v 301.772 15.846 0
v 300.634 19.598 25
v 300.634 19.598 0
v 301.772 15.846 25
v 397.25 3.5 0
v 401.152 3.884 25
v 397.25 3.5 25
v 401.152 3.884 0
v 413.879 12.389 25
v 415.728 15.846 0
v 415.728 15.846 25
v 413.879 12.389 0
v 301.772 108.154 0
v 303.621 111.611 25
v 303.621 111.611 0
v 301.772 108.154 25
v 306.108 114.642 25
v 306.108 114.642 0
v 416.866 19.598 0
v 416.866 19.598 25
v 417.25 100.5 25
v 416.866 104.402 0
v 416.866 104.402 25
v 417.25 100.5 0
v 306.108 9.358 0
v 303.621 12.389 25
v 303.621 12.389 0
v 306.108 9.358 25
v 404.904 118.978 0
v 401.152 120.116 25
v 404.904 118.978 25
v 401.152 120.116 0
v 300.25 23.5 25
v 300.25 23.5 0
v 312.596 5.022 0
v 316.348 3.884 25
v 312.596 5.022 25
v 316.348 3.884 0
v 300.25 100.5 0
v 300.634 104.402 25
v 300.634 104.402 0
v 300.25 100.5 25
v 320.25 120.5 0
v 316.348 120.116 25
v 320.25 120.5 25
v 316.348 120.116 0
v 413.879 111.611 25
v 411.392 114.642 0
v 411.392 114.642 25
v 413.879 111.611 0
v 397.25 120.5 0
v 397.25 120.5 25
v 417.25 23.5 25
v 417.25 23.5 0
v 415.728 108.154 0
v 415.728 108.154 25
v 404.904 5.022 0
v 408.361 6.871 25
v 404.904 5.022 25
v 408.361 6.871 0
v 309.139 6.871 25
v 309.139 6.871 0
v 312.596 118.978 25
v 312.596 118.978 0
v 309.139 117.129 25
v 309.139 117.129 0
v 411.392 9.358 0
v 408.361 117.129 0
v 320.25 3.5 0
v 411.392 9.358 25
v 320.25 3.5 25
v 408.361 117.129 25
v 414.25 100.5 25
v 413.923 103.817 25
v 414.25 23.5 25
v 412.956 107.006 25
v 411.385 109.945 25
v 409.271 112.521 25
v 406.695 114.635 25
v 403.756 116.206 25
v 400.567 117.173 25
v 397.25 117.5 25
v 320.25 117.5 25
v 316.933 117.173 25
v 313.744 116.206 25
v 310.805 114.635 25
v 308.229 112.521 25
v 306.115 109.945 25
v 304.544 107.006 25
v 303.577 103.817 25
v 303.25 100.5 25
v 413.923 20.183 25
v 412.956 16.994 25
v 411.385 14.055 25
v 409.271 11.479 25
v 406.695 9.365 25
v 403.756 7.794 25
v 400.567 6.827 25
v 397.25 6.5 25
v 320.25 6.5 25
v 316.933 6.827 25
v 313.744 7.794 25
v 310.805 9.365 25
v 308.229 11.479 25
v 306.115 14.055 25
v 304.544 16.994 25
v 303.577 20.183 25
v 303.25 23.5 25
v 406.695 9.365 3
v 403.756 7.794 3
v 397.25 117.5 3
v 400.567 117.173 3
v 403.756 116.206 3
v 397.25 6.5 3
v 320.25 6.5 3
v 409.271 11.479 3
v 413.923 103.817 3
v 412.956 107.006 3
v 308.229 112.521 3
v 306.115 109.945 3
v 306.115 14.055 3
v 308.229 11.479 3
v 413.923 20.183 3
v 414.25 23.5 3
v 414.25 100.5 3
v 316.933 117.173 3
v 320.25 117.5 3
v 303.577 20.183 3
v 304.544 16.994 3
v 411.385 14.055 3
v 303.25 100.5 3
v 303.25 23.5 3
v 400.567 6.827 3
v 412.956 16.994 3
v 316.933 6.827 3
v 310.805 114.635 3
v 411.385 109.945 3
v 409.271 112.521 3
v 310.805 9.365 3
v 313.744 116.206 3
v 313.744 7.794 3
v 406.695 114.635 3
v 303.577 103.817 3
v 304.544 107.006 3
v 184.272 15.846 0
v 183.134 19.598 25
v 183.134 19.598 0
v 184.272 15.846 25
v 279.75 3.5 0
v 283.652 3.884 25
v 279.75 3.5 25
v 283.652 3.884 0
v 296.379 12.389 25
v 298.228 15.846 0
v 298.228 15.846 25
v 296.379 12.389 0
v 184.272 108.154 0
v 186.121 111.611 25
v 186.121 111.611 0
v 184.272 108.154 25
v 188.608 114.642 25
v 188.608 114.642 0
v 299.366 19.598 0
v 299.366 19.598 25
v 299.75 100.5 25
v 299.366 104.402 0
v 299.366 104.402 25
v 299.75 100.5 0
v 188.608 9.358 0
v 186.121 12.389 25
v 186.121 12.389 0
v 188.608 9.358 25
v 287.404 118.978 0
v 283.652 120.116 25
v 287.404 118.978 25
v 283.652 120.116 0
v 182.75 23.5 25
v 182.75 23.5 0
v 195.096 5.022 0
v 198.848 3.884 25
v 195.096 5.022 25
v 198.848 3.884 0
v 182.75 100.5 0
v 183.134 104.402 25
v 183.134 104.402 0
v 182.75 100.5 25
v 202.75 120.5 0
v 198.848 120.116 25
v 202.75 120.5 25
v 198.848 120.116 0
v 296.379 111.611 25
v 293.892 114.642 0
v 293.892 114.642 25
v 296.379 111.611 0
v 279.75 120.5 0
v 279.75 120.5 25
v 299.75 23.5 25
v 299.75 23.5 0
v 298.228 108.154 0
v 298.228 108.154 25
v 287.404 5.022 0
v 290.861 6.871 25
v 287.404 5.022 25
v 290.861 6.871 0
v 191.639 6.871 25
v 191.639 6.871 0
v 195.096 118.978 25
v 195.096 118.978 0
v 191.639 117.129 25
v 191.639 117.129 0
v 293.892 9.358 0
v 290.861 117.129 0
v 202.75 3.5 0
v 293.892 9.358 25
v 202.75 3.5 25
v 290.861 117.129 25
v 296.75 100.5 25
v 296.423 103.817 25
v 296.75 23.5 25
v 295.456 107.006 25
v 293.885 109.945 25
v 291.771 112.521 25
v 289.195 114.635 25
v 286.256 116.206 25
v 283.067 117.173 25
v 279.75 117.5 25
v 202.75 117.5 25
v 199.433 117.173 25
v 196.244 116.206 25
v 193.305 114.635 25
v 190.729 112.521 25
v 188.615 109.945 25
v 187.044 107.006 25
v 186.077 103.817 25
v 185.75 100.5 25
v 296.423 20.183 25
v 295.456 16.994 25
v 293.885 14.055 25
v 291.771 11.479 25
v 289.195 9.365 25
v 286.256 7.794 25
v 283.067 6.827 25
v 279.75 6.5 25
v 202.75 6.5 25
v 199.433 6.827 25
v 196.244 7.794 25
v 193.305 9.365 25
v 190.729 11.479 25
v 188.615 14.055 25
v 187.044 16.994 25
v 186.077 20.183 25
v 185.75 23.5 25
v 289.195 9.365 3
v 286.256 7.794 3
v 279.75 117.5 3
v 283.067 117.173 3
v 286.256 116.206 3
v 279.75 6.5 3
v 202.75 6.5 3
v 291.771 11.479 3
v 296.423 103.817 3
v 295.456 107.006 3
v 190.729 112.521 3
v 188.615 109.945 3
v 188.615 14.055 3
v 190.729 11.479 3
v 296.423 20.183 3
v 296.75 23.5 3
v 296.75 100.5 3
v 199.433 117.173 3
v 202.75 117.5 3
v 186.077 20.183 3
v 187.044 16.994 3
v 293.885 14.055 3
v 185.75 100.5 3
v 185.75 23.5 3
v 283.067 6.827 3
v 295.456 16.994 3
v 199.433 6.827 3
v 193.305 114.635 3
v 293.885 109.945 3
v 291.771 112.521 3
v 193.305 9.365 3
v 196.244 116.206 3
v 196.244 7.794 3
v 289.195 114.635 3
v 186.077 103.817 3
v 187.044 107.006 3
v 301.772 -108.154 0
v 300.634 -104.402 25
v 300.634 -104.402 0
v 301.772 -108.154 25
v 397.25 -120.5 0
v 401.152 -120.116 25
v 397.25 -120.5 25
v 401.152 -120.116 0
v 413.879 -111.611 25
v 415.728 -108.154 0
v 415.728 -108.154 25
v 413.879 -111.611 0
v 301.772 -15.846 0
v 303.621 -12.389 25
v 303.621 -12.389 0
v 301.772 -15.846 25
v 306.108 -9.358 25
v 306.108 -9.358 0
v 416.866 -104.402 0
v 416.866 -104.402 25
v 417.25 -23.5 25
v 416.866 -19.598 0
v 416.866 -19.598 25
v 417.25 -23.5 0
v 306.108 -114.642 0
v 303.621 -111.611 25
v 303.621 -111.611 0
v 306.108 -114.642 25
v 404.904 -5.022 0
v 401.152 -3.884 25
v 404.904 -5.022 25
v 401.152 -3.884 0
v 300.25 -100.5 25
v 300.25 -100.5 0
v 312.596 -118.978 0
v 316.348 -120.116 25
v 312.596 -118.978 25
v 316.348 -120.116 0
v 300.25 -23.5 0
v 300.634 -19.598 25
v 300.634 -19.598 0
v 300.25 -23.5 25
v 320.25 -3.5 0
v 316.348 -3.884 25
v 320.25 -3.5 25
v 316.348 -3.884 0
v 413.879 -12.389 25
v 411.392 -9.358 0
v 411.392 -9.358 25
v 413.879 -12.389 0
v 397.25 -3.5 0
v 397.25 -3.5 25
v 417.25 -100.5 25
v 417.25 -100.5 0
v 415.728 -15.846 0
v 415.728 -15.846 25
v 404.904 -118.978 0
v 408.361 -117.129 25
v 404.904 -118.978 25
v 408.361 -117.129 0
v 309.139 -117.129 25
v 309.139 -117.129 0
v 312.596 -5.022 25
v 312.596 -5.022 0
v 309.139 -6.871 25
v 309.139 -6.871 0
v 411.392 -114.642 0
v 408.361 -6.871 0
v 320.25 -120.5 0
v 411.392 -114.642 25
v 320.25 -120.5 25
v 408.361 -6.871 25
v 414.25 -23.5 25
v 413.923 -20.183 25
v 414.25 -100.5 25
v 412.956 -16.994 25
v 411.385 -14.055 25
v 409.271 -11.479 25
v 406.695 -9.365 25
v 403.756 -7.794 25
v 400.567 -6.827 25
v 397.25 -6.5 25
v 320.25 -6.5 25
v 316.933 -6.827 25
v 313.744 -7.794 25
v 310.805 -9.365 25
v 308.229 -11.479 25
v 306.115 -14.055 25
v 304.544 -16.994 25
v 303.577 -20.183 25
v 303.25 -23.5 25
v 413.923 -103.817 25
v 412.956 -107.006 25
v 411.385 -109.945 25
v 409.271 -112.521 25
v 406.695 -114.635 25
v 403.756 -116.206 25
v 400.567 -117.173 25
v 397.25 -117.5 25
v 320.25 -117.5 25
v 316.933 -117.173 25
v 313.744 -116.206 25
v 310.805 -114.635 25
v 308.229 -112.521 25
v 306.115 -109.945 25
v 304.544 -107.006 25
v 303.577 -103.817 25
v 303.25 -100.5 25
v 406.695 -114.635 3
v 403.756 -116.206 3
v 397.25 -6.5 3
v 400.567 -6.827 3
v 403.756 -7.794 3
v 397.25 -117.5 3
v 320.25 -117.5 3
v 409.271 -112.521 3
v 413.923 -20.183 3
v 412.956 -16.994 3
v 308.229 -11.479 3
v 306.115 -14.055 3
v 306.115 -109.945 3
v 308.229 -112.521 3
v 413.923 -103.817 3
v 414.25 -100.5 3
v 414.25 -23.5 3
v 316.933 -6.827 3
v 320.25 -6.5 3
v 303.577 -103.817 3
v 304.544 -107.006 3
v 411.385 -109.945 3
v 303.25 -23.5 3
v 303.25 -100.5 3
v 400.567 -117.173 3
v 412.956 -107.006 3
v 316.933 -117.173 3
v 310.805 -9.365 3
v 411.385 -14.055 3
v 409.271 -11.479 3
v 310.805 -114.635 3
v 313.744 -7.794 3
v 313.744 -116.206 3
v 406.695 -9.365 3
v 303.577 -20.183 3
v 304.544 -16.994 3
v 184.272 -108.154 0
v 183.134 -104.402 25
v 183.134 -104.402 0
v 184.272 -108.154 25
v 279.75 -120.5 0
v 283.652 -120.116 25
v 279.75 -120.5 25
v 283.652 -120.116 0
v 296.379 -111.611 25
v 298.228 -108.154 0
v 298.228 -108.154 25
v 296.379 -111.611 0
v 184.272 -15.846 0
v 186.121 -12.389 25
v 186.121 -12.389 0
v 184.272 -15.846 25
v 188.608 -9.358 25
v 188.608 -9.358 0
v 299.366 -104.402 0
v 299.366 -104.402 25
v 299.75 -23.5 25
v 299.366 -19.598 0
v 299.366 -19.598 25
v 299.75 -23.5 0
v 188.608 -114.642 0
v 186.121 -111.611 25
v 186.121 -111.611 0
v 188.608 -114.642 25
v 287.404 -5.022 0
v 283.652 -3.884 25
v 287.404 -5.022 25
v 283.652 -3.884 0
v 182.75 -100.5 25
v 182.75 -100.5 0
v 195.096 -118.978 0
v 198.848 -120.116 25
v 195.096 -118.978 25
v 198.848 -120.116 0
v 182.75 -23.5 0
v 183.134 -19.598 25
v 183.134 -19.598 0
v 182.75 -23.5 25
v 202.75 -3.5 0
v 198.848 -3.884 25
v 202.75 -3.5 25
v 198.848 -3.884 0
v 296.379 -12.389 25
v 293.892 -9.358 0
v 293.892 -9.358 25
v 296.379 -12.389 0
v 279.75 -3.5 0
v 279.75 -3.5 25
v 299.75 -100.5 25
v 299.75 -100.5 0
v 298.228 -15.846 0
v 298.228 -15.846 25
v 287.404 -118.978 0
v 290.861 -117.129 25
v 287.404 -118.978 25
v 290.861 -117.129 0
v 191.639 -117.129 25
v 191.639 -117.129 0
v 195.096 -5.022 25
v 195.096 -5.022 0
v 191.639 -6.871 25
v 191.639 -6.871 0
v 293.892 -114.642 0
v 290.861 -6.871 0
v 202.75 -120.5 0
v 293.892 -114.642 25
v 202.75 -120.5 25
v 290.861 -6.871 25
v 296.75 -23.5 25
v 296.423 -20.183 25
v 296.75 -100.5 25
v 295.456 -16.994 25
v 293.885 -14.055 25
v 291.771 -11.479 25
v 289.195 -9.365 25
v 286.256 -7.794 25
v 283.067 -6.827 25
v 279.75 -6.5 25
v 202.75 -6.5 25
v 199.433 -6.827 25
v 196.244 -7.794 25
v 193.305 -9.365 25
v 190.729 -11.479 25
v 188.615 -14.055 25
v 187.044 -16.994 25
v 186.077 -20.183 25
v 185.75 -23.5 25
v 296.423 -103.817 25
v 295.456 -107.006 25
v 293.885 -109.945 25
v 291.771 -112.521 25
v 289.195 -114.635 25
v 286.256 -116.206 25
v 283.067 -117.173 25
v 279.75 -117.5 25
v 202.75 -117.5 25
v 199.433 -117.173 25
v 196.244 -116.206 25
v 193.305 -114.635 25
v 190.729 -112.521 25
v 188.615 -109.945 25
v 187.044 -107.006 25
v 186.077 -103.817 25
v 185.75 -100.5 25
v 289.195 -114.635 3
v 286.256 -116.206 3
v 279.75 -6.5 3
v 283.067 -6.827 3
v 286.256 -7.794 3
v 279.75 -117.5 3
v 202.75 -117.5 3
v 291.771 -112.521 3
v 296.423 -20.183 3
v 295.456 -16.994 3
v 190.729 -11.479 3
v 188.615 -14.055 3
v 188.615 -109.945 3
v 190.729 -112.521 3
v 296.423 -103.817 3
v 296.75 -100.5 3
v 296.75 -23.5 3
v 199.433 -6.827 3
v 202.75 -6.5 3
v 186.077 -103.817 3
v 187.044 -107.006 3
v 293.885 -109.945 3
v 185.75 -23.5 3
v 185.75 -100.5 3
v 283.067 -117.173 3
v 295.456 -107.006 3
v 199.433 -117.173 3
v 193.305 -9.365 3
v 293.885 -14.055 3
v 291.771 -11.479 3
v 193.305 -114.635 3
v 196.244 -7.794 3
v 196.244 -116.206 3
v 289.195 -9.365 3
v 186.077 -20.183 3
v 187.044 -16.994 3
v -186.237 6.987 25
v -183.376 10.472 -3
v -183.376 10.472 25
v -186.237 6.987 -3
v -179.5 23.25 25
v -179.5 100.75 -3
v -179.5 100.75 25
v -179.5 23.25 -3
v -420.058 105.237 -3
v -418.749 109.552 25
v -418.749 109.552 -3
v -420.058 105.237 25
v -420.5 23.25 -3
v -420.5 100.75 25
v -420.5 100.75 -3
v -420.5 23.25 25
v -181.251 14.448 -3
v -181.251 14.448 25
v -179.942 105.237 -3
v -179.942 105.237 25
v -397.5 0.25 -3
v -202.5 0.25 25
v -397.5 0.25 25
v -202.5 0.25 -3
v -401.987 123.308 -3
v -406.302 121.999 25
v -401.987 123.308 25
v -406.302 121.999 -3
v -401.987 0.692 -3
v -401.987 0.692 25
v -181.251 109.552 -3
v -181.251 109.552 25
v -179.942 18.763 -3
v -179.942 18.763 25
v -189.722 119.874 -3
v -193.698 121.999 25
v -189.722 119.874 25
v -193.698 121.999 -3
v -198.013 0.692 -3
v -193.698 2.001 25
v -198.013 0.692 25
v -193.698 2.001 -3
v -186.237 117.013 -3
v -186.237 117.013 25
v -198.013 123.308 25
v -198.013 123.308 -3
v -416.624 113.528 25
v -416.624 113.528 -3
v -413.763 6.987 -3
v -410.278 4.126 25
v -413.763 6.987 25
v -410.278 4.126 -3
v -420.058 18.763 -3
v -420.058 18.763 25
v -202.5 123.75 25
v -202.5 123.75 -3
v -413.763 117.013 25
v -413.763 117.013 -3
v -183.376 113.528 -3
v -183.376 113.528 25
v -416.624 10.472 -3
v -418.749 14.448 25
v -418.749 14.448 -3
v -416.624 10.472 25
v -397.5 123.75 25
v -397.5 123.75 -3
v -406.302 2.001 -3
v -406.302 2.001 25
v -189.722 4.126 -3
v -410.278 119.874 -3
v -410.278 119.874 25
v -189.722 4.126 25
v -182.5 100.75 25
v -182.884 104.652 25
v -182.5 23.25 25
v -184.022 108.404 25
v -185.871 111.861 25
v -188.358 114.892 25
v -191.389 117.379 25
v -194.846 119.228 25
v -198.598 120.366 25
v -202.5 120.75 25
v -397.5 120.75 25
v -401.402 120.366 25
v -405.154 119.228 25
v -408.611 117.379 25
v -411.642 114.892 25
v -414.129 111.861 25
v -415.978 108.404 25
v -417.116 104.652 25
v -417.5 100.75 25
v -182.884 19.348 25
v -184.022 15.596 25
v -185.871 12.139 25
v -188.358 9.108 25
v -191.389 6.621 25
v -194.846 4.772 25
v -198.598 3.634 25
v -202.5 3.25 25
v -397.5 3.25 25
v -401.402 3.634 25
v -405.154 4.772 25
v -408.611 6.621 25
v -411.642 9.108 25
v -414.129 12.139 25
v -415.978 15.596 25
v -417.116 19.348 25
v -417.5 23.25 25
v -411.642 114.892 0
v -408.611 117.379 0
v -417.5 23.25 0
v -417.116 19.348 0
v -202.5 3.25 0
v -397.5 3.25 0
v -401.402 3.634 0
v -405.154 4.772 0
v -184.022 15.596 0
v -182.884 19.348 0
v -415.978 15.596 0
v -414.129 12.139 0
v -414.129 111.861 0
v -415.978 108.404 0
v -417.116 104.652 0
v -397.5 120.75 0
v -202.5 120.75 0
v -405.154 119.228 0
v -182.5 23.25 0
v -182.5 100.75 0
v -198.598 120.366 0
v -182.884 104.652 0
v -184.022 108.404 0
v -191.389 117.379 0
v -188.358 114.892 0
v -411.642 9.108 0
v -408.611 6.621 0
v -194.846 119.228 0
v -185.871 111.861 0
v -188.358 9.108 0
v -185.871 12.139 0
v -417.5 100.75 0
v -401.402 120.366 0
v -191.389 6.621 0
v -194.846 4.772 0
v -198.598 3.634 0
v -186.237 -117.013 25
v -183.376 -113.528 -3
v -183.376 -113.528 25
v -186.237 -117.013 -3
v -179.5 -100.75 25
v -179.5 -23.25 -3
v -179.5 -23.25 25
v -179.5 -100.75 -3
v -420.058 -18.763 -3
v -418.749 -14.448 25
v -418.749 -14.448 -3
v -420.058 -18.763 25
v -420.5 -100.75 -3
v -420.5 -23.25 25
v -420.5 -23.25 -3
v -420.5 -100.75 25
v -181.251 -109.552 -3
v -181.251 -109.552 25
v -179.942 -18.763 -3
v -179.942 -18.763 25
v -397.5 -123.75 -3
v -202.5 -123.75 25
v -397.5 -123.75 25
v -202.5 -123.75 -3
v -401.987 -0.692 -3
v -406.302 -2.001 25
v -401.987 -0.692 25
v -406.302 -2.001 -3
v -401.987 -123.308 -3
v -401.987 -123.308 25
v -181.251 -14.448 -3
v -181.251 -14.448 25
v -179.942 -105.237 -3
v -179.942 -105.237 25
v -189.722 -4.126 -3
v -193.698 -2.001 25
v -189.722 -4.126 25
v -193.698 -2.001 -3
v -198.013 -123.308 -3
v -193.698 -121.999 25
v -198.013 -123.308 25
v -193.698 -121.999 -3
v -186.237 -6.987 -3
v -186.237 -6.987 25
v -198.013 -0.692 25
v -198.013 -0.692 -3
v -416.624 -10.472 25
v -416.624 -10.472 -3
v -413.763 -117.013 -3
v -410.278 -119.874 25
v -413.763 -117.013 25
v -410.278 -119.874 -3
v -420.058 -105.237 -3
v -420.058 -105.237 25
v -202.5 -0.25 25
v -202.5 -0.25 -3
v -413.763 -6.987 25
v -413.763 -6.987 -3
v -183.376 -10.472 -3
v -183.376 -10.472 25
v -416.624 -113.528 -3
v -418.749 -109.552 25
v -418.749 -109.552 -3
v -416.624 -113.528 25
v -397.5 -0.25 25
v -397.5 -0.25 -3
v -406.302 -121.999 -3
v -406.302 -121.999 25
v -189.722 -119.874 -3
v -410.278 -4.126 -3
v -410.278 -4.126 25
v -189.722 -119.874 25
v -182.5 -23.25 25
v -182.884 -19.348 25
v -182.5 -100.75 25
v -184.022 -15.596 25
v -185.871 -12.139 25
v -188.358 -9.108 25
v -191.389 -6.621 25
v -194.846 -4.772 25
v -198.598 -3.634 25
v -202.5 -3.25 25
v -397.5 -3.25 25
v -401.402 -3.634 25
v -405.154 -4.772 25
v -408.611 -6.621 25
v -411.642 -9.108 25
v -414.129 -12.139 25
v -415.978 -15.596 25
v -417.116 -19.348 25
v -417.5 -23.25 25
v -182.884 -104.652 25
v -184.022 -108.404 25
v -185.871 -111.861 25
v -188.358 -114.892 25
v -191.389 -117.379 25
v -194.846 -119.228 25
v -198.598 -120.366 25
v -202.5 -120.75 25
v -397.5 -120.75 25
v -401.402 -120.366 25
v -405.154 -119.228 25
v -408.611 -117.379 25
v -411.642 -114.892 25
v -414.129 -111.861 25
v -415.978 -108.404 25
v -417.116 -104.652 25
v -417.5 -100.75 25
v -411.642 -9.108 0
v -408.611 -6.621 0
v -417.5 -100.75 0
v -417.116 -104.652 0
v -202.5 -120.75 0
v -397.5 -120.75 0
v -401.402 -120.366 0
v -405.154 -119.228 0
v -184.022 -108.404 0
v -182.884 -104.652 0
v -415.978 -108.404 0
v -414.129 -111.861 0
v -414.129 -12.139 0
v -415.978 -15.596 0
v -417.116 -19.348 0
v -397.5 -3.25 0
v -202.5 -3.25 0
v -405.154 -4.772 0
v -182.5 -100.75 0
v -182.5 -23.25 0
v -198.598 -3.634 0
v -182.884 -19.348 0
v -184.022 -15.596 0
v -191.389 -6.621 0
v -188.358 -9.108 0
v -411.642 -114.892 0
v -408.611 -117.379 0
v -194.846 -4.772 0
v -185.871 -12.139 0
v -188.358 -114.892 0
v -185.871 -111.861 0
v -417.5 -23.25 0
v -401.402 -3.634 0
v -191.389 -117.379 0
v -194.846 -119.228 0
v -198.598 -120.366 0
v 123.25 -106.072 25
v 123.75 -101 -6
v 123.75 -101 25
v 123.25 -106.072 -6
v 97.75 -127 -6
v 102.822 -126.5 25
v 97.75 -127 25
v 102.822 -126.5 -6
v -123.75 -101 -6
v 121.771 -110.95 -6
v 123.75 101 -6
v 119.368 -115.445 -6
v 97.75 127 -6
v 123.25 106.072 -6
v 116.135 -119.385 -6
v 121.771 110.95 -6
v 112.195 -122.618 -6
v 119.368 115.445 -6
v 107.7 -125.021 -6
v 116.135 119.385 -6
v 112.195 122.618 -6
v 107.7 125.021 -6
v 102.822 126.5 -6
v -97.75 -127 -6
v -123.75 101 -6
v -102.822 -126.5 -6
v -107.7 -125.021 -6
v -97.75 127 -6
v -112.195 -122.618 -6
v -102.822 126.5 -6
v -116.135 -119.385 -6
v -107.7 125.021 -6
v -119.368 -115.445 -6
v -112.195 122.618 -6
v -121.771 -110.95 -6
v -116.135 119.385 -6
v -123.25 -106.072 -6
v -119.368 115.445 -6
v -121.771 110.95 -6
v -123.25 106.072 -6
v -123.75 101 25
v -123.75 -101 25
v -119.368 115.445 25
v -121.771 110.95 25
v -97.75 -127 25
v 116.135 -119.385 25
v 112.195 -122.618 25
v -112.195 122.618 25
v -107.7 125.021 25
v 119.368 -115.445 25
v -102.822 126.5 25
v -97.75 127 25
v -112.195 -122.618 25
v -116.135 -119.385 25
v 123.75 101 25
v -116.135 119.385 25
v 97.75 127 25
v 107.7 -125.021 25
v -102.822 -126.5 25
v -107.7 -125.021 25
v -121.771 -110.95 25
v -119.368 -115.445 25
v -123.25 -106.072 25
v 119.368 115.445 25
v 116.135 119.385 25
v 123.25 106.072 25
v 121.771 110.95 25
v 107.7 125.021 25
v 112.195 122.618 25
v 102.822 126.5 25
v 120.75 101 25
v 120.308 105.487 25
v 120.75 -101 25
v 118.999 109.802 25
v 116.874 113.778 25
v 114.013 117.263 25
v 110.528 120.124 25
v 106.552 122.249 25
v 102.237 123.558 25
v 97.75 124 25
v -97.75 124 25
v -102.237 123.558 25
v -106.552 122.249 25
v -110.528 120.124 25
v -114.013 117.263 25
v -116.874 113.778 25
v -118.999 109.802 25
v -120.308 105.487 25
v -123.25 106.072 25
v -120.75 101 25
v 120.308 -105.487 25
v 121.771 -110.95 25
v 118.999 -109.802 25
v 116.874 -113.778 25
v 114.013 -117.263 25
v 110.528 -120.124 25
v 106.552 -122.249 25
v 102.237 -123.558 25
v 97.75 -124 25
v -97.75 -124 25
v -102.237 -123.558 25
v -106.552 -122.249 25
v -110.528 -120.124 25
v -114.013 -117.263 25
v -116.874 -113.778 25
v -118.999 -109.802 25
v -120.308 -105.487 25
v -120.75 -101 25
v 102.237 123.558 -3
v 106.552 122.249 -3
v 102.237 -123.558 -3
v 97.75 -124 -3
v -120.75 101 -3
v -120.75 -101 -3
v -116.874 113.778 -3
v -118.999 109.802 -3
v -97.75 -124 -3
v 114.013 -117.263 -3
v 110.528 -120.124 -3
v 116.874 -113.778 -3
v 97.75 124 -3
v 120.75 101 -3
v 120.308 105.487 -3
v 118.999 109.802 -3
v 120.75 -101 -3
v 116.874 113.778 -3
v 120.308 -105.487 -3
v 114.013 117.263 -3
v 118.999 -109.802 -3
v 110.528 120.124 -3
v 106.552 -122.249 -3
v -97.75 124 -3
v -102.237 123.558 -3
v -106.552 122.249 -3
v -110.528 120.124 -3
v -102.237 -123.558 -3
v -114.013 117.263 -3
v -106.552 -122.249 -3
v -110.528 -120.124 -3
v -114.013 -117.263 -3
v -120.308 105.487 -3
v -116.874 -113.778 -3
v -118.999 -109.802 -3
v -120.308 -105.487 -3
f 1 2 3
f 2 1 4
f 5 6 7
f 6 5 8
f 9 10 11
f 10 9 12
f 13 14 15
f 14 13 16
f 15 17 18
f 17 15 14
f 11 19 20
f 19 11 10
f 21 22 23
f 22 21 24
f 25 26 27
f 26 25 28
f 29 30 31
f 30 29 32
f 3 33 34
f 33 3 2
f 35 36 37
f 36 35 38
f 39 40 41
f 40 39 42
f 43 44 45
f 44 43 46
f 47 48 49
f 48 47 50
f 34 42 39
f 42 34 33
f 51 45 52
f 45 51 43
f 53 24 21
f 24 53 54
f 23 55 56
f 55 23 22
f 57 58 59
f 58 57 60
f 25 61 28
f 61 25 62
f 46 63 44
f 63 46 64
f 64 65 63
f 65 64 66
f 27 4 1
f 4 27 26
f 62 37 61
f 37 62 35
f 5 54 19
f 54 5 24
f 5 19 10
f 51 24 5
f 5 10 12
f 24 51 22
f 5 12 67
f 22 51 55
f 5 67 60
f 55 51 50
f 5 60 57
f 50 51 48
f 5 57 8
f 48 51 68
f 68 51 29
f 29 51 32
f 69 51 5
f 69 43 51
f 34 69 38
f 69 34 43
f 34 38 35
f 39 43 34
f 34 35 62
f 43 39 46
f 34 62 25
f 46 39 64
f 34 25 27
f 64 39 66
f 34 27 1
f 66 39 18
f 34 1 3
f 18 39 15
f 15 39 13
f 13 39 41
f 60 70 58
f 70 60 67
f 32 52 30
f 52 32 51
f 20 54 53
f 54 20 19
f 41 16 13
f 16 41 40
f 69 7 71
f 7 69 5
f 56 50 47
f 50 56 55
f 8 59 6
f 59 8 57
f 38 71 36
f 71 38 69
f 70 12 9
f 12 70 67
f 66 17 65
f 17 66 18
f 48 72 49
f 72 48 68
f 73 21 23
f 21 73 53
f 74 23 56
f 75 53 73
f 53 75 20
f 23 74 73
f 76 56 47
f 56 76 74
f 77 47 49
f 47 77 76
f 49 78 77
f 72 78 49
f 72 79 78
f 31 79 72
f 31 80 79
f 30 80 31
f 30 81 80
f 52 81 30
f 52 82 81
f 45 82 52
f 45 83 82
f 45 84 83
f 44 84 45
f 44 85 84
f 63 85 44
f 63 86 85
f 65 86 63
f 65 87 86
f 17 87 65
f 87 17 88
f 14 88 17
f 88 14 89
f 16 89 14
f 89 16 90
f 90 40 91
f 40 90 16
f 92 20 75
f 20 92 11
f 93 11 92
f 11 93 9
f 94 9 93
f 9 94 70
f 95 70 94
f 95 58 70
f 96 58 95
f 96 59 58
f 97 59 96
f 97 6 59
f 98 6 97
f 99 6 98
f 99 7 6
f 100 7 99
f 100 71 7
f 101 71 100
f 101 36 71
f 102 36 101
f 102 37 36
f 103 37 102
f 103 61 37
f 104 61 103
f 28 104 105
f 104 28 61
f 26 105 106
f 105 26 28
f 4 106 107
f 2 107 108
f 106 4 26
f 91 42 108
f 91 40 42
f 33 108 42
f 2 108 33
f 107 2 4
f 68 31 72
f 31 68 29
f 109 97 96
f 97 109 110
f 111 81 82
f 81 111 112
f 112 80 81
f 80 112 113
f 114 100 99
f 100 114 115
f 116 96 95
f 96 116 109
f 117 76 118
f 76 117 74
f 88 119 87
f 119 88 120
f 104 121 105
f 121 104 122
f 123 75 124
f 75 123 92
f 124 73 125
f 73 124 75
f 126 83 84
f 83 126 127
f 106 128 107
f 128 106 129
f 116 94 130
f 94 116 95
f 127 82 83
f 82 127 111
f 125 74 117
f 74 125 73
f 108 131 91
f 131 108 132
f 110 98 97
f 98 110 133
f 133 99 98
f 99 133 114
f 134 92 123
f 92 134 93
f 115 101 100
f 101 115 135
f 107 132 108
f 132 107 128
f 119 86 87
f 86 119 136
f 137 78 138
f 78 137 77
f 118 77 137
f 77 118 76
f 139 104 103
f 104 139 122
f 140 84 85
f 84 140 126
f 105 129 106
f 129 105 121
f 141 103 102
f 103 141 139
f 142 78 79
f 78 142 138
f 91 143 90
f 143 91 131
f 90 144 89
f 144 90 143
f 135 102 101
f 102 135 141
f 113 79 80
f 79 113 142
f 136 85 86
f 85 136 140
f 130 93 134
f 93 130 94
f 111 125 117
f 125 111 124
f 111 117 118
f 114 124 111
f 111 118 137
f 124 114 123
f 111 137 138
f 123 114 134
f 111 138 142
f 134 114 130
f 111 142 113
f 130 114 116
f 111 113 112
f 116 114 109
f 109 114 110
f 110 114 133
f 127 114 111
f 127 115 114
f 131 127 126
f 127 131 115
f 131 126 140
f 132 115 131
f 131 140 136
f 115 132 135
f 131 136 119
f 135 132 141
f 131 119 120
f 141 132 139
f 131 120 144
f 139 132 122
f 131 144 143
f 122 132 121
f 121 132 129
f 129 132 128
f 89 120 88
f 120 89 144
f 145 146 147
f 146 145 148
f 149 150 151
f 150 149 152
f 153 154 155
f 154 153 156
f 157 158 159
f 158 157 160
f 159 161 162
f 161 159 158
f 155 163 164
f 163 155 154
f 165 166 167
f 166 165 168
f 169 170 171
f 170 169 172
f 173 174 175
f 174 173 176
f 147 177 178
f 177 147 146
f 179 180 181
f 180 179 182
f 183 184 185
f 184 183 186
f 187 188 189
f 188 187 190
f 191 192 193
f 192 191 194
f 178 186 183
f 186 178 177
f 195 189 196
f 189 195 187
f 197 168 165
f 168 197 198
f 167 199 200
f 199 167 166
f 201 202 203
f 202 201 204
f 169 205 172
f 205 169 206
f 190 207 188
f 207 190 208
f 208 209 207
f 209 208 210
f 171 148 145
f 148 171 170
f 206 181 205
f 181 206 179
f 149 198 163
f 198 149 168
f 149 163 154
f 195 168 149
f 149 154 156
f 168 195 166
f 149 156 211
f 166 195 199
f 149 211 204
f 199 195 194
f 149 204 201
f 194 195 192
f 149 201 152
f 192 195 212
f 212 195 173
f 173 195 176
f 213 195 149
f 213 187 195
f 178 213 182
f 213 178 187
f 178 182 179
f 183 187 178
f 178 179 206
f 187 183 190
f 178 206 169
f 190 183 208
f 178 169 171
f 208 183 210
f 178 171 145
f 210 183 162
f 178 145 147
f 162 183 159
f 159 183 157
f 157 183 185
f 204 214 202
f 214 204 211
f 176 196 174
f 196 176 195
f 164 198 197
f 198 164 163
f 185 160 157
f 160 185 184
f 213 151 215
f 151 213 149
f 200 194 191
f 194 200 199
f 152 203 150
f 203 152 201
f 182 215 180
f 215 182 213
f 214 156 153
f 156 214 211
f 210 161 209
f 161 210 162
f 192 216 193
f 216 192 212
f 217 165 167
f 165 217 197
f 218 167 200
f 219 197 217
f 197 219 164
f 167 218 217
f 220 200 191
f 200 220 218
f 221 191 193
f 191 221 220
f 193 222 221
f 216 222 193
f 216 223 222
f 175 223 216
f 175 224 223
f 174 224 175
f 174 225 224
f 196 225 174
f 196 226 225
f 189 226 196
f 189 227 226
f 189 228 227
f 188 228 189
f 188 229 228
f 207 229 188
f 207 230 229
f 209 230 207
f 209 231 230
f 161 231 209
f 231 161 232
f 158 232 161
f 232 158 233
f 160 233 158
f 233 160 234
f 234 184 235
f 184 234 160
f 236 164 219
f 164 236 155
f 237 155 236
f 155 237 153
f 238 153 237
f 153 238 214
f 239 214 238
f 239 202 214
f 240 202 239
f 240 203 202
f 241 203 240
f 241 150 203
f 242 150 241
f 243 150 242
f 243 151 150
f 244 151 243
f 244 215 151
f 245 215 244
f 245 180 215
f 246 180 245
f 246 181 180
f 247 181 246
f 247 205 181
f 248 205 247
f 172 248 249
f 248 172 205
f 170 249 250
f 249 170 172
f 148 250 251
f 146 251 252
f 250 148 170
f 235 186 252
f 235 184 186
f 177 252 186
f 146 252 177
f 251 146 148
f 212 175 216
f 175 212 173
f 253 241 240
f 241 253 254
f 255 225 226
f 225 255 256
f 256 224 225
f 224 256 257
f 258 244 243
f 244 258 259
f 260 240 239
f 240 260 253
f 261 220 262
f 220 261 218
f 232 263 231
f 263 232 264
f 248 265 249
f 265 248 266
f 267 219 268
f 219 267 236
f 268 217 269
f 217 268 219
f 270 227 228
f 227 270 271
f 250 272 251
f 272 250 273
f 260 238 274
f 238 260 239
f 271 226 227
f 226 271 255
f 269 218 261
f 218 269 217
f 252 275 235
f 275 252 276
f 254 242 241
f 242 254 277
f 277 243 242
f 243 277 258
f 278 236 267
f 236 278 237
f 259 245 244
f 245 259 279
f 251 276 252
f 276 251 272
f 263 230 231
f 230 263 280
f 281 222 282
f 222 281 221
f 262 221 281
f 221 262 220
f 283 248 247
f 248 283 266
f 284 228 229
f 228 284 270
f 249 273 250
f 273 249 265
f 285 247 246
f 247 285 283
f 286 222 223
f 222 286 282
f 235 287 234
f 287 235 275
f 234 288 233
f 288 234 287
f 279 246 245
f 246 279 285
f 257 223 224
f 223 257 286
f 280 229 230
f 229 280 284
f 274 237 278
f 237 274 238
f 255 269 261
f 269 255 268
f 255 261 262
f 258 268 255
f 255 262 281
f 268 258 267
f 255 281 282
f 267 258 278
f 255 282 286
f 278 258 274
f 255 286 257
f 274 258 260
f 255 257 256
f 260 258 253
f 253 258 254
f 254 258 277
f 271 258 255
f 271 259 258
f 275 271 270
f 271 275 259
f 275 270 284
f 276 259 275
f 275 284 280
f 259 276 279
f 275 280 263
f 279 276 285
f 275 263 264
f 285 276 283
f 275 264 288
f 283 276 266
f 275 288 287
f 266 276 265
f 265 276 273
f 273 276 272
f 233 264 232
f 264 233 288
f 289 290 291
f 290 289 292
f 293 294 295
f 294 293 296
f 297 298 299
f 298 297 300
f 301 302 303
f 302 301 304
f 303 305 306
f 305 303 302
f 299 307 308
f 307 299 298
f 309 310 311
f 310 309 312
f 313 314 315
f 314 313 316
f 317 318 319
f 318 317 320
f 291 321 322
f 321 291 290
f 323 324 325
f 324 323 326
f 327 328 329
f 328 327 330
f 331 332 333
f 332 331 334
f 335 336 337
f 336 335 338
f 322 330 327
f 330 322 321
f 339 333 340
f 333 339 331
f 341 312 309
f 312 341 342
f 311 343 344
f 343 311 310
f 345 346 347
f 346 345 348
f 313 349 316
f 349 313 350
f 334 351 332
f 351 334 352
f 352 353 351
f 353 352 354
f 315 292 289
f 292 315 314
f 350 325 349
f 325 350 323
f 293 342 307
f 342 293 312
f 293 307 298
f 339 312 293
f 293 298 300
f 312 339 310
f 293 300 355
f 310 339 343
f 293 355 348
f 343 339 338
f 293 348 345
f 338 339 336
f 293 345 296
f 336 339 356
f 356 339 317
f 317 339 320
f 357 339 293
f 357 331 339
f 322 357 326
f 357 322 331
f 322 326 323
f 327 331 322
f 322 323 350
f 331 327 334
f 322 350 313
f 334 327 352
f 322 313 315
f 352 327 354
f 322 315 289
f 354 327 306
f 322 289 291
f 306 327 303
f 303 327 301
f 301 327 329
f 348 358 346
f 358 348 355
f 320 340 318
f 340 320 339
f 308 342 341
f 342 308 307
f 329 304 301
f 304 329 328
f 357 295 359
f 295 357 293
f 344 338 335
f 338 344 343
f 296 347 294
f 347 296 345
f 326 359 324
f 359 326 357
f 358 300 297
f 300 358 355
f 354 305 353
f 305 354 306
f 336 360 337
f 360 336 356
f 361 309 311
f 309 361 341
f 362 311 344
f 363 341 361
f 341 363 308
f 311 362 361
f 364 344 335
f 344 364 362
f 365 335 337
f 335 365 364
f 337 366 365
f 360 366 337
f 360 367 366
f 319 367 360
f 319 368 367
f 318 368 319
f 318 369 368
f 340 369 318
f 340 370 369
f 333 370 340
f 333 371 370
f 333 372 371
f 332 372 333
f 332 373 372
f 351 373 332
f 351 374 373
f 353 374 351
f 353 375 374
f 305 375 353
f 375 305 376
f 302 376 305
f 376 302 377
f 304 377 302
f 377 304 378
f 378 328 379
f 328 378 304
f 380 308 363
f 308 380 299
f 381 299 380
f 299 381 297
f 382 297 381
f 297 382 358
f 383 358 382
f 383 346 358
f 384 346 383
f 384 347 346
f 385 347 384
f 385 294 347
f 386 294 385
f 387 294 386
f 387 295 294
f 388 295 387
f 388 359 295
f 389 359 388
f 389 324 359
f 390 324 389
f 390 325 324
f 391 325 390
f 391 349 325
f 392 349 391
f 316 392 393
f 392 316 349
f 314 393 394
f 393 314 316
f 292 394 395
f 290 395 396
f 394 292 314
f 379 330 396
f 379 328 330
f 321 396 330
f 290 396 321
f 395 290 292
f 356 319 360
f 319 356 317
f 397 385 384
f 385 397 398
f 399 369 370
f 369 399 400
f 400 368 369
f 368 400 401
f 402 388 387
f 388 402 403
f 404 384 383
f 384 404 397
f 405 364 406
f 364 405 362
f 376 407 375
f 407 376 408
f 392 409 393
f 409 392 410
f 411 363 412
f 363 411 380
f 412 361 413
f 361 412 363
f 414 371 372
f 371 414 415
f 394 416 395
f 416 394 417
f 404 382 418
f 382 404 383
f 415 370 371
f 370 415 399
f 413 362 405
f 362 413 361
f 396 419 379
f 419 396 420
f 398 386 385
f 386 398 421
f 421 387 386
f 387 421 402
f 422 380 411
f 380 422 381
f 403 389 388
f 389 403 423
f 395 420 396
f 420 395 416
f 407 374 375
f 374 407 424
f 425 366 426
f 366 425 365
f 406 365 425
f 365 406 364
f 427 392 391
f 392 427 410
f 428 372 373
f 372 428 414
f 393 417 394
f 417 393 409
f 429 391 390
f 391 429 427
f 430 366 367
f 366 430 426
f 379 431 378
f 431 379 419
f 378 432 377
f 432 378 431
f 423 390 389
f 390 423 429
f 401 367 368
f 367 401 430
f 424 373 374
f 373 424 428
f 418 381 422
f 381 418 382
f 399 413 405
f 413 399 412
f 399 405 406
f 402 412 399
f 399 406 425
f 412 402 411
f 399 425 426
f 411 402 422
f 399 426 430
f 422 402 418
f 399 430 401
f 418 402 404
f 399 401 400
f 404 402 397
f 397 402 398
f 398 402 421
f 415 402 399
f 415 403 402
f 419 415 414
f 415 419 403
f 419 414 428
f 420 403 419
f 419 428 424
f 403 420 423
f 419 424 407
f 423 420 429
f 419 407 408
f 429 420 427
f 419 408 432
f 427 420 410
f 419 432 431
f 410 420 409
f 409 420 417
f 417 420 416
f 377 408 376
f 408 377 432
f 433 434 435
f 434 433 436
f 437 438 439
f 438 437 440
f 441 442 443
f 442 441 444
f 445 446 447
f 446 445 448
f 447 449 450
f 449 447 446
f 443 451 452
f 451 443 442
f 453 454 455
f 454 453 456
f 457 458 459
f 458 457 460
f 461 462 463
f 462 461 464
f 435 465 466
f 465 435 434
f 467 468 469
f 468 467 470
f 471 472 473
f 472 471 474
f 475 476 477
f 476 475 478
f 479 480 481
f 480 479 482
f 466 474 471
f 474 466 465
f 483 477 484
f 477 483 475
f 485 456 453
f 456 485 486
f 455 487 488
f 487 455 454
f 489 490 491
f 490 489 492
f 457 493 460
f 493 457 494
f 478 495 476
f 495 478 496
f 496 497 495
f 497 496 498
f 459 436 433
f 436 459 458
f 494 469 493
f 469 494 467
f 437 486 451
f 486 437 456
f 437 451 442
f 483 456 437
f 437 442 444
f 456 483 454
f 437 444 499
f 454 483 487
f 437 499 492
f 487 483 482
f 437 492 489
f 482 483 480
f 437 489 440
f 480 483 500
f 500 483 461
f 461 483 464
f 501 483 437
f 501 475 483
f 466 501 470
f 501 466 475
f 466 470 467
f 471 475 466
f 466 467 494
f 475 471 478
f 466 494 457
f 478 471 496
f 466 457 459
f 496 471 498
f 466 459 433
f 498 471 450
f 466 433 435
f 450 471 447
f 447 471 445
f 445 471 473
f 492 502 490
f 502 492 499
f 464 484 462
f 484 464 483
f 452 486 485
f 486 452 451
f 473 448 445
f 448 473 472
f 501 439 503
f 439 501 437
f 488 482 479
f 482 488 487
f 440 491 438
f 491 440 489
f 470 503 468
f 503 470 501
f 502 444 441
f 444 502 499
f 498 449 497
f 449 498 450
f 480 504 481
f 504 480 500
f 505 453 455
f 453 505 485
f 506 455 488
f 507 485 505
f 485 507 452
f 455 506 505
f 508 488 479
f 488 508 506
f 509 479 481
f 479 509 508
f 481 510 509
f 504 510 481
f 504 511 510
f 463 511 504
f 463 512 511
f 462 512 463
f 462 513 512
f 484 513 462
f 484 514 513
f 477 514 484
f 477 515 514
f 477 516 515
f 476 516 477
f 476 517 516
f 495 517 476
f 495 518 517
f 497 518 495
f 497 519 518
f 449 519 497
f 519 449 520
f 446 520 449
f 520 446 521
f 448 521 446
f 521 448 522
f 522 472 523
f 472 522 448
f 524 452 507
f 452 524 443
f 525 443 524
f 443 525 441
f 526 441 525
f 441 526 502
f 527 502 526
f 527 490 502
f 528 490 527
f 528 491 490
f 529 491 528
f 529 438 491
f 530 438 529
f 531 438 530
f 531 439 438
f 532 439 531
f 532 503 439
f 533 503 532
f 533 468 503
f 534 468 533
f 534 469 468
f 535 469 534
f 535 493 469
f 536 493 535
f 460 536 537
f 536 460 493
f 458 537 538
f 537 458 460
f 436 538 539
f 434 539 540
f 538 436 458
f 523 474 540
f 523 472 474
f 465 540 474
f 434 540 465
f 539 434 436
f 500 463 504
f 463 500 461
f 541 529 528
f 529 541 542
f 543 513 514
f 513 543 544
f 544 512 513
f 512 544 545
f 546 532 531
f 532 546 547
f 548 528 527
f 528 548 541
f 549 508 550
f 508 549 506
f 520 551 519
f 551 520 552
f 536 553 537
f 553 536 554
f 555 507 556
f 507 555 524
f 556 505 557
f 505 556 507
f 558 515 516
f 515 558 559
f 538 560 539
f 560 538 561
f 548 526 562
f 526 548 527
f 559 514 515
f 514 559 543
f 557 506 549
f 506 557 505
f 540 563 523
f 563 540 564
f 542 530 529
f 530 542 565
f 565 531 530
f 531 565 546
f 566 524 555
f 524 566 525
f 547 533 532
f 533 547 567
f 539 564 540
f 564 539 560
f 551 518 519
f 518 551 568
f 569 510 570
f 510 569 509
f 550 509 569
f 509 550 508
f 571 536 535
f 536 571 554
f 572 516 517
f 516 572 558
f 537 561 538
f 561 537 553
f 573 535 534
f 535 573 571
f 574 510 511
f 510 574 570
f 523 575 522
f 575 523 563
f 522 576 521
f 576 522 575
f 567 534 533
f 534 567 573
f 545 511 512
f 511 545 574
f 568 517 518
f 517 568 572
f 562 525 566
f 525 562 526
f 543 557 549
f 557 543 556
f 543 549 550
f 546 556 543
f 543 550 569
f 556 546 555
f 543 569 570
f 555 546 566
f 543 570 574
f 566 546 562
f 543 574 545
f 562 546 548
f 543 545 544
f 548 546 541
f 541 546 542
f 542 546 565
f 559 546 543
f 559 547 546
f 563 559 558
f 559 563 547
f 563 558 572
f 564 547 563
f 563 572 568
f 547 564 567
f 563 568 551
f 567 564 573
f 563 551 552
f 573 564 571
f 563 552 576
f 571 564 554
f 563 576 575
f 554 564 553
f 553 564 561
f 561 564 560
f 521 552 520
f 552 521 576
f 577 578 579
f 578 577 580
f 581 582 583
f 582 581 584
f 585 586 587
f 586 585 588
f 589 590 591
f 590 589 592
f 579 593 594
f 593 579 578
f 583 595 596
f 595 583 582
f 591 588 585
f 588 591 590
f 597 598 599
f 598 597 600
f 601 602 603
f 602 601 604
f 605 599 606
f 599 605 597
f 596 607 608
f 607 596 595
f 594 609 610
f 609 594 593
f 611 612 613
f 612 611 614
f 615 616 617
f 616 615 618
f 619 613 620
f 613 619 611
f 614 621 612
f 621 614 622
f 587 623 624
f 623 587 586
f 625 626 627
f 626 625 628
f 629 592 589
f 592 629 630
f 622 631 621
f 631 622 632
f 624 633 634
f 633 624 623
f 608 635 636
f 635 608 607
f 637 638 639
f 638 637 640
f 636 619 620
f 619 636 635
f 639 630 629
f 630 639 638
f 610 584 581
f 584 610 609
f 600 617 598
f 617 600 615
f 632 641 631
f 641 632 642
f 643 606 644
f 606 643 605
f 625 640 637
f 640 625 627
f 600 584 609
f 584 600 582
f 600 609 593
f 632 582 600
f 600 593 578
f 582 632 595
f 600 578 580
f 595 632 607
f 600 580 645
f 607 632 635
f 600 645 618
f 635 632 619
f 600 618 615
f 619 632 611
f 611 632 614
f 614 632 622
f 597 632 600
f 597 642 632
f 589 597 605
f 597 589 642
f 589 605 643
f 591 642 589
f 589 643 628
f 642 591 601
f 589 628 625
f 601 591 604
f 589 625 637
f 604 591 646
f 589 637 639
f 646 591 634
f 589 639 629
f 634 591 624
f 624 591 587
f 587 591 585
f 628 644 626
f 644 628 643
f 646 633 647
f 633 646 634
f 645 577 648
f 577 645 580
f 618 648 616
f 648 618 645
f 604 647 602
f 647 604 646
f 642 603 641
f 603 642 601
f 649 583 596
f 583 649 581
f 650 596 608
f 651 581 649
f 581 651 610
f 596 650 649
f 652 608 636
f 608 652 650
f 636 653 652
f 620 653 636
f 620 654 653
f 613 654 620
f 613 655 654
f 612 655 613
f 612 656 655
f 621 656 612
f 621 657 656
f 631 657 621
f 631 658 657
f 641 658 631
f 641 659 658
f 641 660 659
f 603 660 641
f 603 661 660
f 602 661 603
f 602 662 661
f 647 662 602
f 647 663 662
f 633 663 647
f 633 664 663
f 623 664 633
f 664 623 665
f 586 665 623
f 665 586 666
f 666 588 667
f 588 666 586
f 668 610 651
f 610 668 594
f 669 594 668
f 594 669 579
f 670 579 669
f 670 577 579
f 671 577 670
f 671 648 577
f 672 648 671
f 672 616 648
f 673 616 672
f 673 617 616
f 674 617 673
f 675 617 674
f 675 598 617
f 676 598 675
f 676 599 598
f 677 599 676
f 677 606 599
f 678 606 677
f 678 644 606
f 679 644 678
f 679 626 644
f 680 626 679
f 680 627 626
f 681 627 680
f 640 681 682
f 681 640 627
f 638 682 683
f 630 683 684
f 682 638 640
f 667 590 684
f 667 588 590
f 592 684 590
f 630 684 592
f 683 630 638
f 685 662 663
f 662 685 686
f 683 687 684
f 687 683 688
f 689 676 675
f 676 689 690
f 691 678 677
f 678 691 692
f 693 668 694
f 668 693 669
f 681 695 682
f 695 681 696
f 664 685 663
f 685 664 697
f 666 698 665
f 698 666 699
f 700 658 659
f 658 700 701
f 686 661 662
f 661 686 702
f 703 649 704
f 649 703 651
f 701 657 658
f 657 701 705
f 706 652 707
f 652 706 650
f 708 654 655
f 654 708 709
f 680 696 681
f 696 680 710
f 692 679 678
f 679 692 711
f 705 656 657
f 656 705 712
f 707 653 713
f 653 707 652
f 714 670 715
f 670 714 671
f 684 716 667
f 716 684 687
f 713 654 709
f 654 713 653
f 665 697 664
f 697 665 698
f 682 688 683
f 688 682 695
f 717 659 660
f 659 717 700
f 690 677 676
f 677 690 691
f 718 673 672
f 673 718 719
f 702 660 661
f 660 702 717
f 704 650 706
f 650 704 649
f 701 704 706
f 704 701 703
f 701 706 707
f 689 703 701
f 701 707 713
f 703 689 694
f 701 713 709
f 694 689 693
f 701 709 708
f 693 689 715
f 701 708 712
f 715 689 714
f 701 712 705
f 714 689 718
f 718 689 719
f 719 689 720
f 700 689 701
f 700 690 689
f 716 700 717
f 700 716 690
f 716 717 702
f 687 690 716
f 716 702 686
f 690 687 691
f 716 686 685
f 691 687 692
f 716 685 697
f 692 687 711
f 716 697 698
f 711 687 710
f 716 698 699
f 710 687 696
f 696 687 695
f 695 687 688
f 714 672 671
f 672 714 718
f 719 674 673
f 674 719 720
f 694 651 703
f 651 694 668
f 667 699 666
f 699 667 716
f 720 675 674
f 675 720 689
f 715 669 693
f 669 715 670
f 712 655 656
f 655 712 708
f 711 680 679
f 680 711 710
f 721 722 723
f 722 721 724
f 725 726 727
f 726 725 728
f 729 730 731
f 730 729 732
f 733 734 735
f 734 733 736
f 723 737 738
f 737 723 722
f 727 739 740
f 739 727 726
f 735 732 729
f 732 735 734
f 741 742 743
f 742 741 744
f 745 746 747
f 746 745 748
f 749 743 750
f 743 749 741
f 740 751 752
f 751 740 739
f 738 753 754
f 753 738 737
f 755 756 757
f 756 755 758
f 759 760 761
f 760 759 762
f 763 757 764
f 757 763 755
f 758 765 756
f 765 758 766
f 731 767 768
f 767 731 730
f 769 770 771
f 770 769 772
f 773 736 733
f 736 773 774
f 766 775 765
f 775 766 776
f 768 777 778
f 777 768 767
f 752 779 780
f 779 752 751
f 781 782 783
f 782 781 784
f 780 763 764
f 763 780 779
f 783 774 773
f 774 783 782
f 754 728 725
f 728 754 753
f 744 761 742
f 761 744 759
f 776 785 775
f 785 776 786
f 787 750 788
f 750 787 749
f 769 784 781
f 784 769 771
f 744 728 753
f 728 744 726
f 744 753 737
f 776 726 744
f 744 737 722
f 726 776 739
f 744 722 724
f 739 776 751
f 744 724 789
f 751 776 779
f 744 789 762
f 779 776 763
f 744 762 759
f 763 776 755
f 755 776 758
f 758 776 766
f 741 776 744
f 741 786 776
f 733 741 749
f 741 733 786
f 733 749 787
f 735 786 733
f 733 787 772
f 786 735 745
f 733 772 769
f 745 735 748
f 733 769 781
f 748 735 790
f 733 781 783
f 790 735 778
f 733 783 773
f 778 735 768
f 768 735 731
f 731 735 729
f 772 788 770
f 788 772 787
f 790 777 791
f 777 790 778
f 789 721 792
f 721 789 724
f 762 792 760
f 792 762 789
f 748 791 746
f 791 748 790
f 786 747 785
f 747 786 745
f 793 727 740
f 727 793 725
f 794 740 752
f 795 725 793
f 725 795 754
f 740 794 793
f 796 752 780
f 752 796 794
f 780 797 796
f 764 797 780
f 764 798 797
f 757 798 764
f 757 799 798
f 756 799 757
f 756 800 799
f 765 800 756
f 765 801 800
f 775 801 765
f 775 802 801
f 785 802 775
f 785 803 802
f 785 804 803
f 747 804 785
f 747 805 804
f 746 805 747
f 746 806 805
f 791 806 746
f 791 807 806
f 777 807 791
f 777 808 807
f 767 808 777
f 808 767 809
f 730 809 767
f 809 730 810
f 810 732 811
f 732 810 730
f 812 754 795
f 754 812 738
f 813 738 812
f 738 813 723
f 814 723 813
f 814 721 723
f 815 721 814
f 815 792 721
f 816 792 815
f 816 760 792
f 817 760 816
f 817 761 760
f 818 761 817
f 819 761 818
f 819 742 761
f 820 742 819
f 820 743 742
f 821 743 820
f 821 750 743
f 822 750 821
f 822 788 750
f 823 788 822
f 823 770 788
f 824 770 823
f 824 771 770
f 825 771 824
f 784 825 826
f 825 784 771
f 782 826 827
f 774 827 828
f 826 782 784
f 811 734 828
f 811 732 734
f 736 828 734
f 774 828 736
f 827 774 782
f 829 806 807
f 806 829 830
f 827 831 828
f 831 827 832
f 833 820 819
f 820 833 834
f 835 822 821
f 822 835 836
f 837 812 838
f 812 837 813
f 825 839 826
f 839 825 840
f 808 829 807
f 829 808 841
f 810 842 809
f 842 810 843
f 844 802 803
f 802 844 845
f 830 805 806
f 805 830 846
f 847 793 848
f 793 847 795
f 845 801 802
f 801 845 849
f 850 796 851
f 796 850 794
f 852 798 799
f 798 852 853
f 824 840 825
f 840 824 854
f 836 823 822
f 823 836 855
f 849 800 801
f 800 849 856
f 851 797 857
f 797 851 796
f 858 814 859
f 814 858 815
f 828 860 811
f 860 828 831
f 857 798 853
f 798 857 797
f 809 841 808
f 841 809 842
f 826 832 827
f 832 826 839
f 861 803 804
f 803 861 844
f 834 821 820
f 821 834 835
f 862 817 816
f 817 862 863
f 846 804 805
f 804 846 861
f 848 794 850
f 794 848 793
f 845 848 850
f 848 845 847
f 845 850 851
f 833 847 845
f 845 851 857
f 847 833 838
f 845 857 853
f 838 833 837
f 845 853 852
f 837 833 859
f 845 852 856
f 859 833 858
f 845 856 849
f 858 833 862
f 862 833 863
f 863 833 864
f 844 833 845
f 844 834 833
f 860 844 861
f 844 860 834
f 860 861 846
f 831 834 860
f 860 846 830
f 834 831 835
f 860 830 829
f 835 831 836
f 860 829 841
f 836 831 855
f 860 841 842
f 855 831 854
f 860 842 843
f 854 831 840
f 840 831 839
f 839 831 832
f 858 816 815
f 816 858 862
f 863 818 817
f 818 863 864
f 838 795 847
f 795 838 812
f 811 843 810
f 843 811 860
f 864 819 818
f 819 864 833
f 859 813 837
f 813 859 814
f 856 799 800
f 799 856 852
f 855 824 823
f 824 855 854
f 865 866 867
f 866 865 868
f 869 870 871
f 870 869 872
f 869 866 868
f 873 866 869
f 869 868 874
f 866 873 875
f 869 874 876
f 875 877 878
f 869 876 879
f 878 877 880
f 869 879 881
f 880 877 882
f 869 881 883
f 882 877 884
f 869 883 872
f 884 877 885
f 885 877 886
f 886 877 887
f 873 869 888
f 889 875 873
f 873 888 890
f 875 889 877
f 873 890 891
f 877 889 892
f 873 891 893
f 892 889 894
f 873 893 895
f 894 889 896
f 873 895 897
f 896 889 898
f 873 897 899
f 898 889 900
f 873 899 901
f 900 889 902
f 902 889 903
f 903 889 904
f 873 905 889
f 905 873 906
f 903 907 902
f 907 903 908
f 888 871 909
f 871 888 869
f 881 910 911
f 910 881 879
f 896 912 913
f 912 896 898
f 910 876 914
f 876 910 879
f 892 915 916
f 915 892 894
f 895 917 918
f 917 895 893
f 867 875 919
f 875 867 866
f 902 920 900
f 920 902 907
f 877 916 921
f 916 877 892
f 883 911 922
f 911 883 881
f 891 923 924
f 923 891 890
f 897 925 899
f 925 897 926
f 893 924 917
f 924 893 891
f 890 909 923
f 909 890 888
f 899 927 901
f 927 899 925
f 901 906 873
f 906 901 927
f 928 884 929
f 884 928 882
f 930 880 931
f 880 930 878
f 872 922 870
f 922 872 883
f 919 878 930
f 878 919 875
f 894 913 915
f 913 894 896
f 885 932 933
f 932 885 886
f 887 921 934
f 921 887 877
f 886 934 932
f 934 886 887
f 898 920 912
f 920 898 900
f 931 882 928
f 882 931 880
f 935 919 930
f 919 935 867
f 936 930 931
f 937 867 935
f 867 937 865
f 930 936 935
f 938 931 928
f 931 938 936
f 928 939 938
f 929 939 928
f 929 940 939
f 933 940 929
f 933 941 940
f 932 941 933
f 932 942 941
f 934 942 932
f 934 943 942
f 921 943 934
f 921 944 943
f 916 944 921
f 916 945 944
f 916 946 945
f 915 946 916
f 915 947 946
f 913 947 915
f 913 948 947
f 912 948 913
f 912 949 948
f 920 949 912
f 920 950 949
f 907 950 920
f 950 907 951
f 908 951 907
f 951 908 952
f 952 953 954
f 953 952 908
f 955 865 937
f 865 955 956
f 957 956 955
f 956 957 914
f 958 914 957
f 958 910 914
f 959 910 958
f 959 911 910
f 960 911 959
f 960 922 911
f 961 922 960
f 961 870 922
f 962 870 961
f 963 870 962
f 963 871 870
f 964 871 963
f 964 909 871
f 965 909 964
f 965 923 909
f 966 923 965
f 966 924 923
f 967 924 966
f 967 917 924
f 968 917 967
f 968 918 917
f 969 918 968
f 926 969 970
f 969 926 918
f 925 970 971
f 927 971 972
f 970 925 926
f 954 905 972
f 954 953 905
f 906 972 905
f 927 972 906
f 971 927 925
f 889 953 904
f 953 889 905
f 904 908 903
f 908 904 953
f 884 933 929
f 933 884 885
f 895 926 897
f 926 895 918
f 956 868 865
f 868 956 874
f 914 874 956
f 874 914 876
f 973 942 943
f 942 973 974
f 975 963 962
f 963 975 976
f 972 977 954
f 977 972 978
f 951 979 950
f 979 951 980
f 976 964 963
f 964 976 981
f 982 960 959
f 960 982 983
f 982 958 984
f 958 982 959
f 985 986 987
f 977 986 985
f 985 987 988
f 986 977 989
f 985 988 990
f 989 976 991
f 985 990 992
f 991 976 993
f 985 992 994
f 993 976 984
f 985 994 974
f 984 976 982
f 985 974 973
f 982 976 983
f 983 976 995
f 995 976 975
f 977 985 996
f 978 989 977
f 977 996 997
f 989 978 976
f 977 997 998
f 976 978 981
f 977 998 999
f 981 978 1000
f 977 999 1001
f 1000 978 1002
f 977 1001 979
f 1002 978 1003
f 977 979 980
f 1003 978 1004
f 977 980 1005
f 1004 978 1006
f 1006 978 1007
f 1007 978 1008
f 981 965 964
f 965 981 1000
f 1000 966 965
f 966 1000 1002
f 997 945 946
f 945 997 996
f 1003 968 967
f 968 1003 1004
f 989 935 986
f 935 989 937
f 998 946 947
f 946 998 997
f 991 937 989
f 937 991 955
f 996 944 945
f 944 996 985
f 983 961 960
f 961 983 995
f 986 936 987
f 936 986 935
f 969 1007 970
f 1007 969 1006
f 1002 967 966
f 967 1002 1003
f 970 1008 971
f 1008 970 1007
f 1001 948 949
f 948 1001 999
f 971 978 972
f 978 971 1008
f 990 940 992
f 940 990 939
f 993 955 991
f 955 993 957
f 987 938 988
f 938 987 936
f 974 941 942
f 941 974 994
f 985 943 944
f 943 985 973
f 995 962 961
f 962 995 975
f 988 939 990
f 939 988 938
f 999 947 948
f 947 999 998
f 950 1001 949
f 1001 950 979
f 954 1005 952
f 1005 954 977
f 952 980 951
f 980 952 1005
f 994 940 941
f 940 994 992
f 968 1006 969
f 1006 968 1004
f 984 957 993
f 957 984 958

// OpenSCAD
wall=3;
height=30;
marge = .5;


l1 = 117;
p1 = l1;
h1 = 25;
r1 = 20;

l2 = l1*2+wall*2+marge*2;
p2 = p1+wall*2+marge;
h2 = h1+wall;
r2 = r1+wall;

l3 = l2+wall*2+marge;
p3 = p2*2+wall*2+marge*2;
h3 = h2+wall;
r3 = r2+wall;

translate([300,0,0]) {
translate([ l1/2+marge/2,p1/2+wall+marge,0])
	box(l1,p1,h1,r1);
translate([-l1/2-marge/2,p1/2+wall+marge,0])
	box(l1,p1,h1,r1);
translate([ l1/2+marge/2, -p1/2-wall-marge,0])
	box(l1,p1,h1,r1);
translate([-l1/2-marge/2, -p1/2-wall-marge,0])
	box(l1,p1,h1,r1);
}

translate([-300,0,0]) {
	translate([0, p2/2+marge/2,-wall])
		box(l2,p2,h2,r2);
	translate([0,-p2/2-marge/2,-wall])
		box(l2,p2,h2,r2);
}

translate([0,0,-wall*2])
	box(l3,p3,h3,r3);


module box(largeur, profondeur, hauteur, rayon) {
	difference() {
		rounded_cube(largeur, profondeur, hauteur, rayon);
		translate([0,0,3])
			rounded_cube(largeur-wall*2, profondeur-wall*2, hauteur, rayon-wall);
	}
}

module rounded_cube(largeur, profondeur, hauteur, rayon) {
	x = largeur/2-rayon;
	y = profondeur/2-rayon;
	hull() {
		translate([-x, -y, 0])
			cylinder(hauteur, rayon, rayon, $fn=32);
		translate([ x, -y, 0])
			cylinder(hauteur, rayon, rayon, $fn=32);
		translate([ x,  y, 0])
			cylinder(hauteur, rayon, rayon, $fn=32);
		translate([-x,  y, 0])
			cylinder(hauteur, rayon, rayon, $fn=32);
	}
}
